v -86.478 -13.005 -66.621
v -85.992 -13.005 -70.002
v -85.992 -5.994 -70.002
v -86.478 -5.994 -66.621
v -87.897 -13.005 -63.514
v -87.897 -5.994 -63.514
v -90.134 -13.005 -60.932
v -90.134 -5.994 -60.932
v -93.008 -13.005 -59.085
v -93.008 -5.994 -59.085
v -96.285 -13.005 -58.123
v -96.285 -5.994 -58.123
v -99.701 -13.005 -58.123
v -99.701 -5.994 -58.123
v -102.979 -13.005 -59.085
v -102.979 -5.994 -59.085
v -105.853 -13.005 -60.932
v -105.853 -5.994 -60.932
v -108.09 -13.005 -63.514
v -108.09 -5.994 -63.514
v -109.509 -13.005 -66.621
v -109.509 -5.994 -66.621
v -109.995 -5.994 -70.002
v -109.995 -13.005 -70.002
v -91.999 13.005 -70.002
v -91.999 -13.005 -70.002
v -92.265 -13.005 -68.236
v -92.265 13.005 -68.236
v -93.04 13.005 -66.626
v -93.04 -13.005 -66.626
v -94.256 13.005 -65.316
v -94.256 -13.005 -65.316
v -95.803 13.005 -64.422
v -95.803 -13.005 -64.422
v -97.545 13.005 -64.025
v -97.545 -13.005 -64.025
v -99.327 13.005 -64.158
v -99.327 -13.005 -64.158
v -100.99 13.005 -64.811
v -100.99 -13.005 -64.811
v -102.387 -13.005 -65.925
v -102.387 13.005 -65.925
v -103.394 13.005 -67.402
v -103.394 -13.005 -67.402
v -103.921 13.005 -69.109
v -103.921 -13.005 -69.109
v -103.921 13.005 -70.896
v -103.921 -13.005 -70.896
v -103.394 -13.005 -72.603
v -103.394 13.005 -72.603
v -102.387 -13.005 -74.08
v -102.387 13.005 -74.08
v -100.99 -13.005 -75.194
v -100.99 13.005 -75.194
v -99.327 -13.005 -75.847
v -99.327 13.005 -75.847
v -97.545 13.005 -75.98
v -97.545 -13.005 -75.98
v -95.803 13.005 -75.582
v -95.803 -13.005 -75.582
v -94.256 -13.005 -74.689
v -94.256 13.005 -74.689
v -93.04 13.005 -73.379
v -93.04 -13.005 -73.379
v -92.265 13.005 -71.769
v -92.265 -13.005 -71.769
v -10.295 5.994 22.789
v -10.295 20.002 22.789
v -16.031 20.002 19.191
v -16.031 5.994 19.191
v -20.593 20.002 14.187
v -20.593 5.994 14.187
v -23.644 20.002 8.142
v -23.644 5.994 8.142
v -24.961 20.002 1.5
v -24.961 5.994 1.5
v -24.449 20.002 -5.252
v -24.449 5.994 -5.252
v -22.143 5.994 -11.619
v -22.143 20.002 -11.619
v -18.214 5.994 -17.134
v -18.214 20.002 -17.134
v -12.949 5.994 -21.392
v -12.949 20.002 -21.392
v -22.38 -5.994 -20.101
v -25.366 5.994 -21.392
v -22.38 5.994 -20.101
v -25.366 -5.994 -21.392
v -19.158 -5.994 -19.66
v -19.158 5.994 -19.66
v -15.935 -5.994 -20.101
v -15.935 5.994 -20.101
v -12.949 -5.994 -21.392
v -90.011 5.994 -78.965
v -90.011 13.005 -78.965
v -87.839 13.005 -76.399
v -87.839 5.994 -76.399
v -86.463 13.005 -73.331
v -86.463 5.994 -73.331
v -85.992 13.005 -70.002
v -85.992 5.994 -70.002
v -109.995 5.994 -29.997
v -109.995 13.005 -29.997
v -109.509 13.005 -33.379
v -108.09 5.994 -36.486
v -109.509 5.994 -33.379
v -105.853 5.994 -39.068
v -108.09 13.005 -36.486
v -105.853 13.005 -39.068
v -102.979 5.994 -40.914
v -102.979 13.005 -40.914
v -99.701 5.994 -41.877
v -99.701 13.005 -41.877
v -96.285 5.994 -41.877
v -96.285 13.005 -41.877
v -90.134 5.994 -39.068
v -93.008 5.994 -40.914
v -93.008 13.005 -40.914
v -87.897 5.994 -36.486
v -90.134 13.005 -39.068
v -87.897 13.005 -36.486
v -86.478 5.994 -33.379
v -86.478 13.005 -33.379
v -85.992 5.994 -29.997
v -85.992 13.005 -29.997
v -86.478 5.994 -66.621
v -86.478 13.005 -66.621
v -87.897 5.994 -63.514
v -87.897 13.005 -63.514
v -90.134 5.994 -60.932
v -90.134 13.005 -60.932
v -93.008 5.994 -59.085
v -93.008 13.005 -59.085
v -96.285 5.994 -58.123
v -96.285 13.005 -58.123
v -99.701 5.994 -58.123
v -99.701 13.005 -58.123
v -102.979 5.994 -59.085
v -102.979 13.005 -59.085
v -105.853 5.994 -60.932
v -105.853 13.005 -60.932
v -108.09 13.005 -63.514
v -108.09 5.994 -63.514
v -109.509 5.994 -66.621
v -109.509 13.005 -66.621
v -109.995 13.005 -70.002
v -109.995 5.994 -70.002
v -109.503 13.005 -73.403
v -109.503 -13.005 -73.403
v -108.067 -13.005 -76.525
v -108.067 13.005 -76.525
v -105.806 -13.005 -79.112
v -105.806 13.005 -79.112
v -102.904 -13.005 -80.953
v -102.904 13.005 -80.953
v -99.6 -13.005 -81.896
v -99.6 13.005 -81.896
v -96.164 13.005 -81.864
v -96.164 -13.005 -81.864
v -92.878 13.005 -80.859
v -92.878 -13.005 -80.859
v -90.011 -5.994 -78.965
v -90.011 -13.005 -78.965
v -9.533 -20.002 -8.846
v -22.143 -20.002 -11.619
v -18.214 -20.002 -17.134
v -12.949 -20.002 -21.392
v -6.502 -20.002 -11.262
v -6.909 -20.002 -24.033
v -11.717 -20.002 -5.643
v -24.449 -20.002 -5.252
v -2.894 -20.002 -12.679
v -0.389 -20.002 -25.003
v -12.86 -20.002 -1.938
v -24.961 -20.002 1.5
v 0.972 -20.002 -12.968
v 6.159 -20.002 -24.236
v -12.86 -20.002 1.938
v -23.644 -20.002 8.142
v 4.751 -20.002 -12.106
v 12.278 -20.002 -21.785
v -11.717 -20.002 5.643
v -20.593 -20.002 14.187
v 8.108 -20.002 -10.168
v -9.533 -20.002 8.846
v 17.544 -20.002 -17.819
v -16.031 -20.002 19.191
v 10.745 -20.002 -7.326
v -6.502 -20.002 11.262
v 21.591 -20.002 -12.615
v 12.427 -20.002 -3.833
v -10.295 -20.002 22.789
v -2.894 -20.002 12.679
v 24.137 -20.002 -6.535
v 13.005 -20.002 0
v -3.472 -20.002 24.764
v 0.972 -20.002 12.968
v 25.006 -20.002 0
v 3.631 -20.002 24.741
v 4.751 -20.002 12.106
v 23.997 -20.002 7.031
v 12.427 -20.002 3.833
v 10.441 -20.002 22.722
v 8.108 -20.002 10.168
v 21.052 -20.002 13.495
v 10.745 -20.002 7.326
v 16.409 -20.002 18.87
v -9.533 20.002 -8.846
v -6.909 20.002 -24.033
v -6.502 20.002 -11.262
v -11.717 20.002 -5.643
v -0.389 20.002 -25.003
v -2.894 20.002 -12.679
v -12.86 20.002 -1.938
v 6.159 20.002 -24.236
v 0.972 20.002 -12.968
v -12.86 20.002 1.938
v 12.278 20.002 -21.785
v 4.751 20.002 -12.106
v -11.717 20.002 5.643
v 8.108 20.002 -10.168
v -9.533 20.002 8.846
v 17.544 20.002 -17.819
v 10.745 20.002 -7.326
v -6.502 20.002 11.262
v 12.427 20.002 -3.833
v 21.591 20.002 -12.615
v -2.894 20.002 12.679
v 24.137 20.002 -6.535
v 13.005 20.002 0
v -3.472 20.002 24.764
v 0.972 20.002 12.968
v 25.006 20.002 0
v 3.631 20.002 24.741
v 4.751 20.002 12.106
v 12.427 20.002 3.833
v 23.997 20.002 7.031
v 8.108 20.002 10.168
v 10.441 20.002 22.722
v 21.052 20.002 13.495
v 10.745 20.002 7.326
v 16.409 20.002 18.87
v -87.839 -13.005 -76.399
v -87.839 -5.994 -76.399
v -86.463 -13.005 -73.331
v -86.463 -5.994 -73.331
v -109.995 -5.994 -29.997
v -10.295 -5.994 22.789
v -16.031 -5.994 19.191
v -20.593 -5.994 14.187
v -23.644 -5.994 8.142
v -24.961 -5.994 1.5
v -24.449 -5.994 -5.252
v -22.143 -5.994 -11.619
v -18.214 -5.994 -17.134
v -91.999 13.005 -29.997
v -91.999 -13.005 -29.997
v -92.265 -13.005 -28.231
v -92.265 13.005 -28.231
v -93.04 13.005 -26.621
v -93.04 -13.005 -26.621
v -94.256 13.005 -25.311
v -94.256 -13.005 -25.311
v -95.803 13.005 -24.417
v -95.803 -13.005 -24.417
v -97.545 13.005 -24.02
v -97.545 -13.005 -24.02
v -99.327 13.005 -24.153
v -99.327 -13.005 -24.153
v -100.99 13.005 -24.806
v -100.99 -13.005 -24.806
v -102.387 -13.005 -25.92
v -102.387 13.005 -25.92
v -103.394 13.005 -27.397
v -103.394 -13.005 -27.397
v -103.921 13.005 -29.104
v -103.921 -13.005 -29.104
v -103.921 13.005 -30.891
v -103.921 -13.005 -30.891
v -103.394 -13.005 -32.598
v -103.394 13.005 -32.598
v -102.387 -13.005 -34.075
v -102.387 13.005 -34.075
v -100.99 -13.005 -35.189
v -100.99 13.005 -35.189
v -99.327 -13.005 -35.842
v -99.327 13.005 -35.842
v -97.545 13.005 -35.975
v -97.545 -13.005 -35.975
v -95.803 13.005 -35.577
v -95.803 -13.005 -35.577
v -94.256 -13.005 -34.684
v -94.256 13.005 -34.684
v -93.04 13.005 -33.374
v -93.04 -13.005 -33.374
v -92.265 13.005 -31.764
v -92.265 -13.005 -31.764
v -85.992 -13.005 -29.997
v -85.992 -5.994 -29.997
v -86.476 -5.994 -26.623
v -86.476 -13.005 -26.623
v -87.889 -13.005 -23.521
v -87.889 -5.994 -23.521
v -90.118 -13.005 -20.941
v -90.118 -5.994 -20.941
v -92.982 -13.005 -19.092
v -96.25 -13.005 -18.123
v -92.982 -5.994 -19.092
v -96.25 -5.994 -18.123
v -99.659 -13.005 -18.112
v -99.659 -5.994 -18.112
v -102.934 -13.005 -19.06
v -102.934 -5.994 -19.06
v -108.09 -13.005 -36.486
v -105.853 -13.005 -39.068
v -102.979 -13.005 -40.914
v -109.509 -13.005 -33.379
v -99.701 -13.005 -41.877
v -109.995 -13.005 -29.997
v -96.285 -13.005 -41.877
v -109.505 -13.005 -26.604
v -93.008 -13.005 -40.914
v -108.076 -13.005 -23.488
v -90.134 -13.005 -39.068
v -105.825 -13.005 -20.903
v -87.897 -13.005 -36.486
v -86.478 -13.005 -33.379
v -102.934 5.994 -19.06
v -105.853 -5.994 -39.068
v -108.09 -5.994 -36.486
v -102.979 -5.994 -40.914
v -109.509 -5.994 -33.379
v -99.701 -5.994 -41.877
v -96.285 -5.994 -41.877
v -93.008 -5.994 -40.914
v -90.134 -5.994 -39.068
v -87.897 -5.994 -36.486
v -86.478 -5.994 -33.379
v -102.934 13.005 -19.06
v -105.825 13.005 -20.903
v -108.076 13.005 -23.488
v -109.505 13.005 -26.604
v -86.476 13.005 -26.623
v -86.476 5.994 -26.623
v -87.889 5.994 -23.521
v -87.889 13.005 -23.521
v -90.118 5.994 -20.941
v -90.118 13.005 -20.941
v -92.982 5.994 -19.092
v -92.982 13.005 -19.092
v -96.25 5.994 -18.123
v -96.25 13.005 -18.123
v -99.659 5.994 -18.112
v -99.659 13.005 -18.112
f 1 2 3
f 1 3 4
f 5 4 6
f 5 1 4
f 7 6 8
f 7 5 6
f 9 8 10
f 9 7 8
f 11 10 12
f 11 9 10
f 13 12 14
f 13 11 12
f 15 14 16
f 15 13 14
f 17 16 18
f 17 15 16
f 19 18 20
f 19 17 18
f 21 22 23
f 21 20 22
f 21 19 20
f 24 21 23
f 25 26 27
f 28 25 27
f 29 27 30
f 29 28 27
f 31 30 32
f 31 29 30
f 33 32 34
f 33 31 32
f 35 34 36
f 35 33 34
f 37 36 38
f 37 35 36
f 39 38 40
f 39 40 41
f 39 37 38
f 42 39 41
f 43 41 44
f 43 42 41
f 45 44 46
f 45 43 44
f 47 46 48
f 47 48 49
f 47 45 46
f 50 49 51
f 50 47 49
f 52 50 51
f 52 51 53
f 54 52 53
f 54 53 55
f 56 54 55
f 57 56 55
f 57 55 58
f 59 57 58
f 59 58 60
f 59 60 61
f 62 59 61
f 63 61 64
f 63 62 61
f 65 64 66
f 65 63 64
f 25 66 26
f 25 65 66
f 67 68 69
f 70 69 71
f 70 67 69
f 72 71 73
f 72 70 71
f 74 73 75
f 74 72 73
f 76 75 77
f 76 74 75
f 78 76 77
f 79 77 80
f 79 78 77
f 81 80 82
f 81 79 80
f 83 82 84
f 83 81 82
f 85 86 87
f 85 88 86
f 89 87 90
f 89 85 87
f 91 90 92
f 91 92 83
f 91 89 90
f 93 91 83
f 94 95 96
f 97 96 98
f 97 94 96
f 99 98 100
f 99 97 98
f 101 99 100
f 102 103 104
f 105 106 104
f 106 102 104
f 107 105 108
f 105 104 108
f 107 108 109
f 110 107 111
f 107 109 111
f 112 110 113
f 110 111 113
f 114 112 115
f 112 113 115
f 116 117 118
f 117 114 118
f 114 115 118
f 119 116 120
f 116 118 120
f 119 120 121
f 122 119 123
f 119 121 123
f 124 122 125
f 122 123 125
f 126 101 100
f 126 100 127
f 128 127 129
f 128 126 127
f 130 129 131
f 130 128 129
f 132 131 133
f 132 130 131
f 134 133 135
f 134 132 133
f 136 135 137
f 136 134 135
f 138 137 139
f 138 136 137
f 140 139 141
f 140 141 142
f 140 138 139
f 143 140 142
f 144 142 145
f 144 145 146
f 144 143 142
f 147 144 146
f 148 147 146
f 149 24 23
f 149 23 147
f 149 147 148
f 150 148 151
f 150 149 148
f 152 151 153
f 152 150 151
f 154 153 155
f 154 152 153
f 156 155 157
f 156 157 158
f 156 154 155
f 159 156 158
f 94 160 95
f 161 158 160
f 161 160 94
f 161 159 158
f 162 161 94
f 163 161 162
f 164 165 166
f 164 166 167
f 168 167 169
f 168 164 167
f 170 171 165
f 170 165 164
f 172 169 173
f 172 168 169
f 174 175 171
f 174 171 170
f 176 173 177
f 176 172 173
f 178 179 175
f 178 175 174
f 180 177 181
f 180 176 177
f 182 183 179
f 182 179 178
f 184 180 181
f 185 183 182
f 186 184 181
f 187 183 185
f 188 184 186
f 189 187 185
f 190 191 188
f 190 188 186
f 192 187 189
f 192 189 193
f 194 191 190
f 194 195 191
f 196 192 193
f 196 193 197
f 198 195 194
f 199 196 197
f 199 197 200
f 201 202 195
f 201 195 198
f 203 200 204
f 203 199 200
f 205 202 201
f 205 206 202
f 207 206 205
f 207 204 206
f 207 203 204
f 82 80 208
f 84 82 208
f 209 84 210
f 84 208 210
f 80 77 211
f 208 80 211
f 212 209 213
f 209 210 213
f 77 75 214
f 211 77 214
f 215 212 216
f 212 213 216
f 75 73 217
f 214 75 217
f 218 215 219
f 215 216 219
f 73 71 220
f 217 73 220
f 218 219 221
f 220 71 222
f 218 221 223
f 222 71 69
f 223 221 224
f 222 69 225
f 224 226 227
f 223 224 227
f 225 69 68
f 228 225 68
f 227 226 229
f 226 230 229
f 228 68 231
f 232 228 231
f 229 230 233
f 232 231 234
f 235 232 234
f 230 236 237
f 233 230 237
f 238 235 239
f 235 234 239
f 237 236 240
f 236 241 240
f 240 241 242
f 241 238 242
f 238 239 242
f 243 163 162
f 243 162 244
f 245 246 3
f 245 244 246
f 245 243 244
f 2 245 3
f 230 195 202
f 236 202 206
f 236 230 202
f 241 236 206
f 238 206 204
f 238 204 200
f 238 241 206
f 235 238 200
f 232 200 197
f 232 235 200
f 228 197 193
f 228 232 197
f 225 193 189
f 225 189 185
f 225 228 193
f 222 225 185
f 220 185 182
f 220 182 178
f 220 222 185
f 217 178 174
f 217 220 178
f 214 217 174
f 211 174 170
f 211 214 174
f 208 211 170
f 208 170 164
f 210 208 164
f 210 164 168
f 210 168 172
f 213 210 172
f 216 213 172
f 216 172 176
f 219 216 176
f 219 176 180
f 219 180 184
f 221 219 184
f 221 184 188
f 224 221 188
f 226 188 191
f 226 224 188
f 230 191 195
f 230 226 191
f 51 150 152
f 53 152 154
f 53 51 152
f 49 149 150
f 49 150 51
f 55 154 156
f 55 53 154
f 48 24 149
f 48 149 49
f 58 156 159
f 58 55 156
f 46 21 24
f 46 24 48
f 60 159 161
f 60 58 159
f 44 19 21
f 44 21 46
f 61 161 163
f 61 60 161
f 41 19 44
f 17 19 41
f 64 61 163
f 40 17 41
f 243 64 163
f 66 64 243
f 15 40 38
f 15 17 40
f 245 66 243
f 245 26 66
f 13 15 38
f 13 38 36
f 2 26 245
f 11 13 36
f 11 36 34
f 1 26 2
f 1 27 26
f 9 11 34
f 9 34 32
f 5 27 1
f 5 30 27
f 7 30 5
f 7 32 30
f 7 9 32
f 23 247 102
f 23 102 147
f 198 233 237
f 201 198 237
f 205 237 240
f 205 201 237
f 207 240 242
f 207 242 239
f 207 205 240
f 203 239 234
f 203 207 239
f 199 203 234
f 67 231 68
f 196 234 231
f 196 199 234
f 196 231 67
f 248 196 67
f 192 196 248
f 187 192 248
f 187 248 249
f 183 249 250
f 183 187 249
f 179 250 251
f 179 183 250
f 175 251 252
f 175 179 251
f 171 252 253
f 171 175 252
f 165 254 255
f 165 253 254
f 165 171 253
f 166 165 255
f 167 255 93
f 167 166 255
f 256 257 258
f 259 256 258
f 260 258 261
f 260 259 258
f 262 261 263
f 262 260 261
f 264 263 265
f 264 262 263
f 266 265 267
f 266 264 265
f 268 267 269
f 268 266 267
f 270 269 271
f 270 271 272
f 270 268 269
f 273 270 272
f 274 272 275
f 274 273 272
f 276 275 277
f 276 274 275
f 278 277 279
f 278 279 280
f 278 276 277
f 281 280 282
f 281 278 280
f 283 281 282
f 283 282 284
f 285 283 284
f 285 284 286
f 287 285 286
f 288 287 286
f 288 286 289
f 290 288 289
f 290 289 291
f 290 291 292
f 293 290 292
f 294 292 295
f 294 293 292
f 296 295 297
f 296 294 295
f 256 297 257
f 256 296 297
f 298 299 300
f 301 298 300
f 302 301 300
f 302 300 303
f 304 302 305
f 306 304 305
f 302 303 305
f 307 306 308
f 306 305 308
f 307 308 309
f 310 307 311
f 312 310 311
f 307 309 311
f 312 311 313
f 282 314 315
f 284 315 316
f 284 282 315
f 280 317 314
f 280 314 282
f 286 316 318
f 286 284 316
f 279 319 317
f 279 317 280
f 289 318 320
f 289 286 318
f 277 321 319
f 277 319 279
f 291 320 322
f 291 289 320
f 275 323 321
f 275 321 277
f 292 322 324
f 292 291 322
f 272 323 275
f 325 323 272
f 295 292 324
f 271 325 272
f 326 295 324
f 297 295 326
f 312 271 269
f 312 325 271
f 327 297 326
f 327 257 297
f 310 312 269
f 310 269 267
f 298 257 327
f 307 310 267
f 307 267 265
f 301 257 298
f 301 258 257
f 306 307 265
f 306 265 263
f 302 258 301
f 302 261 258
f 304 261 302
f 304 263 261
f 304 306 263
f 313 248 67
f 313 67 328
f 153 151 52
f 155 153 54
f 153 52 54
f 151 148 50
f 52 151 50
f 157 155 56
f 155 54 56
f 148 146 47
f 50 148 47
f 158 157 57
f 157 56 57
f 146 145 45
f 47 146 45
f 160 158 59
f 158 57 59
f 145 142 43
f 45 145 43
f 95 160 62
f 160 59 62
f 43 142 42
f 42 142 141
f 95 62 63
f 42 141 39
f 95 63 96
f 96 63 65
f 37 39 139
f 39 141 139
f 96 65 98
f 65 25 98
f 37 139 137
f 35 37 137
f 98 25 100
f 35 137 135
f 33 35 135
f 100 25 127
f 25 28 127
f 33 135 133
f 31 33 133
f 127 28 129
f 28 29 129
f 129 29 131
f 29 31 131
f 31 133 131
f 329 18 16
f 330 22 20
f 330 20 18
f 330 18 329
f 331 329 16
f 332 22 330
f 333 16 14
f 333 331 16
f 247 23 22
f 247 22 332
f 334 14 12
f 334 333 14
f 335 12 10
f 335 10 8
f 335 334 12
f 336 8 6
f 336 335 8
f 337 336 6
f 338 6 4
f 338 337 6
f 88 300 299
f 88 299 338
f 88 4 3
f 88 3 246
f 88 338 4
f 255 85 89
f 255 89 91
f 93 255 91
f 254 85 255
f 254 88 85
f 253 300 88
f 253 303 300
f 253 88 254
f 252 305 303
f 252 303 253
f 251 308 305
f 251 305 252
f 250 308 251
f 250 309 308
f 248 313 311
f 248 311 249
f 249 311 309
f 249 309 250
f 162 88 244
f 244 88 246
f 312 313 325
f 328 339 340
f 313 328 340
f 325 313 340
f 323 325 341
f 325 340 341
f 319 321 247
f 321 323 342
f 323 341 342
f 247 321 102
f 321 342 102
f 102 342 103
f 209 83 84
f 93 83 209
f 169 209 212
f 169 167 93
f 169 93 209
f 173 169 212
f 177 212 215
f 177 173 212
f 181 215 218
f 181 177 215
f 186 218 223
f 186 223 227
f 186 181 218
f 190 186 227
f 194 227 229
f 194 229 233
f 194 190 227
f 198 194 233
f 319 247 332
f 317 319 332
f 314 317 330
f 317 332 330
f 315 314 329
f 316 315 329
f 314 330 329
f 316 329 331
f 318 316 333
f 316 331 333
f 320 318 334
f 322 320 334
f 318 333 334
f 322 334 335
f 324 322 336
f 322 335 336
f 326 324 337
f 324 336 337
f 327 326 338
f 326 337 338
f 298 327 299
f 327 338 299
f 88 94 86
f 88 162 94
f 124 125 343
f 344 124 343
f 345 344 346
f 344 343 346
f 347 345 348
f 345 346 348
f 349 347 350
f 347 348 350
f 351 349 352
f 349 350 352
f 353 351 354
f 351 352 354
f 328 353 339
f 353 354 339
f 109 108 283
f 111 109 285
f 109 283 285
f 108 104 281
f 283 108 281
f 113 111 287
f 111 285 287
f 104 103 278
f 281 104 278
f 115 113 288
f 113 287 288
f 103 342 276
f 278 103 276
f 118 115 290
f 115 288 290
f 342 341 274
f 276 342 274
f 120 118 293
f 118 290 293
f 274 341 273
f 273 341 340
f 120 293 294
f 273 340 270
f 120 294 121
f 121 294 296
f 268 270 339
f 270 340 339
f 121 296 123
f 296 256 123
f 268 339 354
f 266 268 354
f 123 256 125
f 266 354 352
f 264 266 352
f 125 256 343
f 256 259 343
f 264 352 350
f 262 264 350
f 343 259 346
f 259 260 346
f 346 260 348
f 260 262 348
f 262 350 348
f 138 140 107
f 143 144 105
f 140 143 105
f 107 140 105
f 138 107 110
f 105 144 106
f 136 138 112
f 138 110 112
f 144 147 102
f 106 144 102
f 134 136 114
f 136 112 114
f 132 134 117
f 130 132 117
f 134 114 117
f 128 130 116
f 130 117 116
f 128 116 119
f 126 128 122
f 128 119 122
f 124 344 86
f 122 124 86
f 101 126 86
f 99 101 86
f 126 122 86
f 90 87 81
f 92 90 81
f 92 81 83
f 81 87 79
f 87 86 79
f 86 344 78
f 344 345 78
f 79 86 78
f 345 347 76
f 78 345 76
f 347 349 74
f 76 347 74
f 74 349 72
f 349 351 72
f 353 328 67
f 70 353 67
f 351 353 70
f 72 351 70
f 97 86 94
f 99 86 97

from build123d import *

# Parameters (mm, degrees)
F0_R     = 13.0048
F1_DEPTH = 20.0025
F2_DEPTH = 5.9944
F0_R_2   = 5.9944
F3_DEPTH = 13.0048


with BuildPart() as f1:
    # F0 (on Front) → F1 (new body, symmetric)
    with BuildSketch(Plane.XZ):
        with BuildLine():
            ThreePointArc((-12.949346, -21.392276), (12.278025, -21.784516), (25.0063, 0))
            ThreePointArc((25.0063, 0), (13.562501, 21.008894), (-10.294693, 22.788908))
            ThreePointArc((-10.294693, 22.788908), (-24.961282, 1.499814), (-12.949346, -21.392276))
        make_face()
        Circle(F0_R, mode=Mode.SUBTRACT)
    extrude(amount=F1_DEPTH, both=True)

    # F0 (on Front) → F2 (join, symmetric)
    with BuildSketch(Plane.XZ):
        with BuildLine():
            ThreePointArc((-12.949346, -21.392276), (-24.961282, 1.499814), (-10.294693, 22.788908))
            Line((-10.294693, 22.788908), (-102.934025, -19.060113))
            ThreePointArc((-102.934025, -19.060113), (-91.484026, -19.914411), (-85.9917, -29.9974))
            ThreePointArc((-85.9917, -29.9974), (-97.9932, -41.9989), (-109.9947, -29.9974))
            Line((-109.9947, -29.9974), (-109.9947, -70.0024))
            ThreePointArc((-109.9947, -70.0024), (-97.9932, -58.0009), (-85.9917, -70.0024))
            ThreePointArc((-85.9917, -70.0024), (-87.042616, -74.913685), (-90.011317, -78.964852))
            Line((-90.011317, -78.964852), (-25.365987, -21.392276))
            ThreePointArc((-25.365987, -21.392276), (-19.157667, -19.6596), (-12.949346, -21.392276))
        make_face()
    extrude(amount=F2_DEPTH, both=True)

    # F0 (on Front) → F3 (join, symmetric)
    with BuildSketch(Plane.XZ):
        with BuildLine():
            ThreePointArc((-85.9917, -29.9974), (-91.484026, -19.914411), (-102.934025, -19.060113))
            ThreePointArc((-102.934025, -19.060113), (-108.076189, -23.488226), (-109.9947, -29.9974))
            ThreePointArc((-109.9947, -29.9974), (-97.9932, -41.9989), (-85.9917, -29.9974))
        make_face()
        with Locations((-97.9932, -29.9974)):
            Circle(F0_R_2, mode=Mode.SUBTRACT)
        with BuildLine():
            ThreePointArc((-109.9947, -70.0024), (-102.904485, -80.952984), (-90.011317, -78.964852))
            ThreePointArc((-90.011317, -78.964852), (-87.042616, -74.913685), (-85.9917, -70.0024))
            ThreePointArc((-85.9917, -70.0024), (-97.9932, -58.0009), (-109.9947, -70.0024))
        make_face()
        with Locations((-97.9932, -70.0024)):
            Circle(F0_R_2, mode=Mode.SUBTRACT)
    extrude(amount=F3_DEPTH, both=True)


solid = f1.part
